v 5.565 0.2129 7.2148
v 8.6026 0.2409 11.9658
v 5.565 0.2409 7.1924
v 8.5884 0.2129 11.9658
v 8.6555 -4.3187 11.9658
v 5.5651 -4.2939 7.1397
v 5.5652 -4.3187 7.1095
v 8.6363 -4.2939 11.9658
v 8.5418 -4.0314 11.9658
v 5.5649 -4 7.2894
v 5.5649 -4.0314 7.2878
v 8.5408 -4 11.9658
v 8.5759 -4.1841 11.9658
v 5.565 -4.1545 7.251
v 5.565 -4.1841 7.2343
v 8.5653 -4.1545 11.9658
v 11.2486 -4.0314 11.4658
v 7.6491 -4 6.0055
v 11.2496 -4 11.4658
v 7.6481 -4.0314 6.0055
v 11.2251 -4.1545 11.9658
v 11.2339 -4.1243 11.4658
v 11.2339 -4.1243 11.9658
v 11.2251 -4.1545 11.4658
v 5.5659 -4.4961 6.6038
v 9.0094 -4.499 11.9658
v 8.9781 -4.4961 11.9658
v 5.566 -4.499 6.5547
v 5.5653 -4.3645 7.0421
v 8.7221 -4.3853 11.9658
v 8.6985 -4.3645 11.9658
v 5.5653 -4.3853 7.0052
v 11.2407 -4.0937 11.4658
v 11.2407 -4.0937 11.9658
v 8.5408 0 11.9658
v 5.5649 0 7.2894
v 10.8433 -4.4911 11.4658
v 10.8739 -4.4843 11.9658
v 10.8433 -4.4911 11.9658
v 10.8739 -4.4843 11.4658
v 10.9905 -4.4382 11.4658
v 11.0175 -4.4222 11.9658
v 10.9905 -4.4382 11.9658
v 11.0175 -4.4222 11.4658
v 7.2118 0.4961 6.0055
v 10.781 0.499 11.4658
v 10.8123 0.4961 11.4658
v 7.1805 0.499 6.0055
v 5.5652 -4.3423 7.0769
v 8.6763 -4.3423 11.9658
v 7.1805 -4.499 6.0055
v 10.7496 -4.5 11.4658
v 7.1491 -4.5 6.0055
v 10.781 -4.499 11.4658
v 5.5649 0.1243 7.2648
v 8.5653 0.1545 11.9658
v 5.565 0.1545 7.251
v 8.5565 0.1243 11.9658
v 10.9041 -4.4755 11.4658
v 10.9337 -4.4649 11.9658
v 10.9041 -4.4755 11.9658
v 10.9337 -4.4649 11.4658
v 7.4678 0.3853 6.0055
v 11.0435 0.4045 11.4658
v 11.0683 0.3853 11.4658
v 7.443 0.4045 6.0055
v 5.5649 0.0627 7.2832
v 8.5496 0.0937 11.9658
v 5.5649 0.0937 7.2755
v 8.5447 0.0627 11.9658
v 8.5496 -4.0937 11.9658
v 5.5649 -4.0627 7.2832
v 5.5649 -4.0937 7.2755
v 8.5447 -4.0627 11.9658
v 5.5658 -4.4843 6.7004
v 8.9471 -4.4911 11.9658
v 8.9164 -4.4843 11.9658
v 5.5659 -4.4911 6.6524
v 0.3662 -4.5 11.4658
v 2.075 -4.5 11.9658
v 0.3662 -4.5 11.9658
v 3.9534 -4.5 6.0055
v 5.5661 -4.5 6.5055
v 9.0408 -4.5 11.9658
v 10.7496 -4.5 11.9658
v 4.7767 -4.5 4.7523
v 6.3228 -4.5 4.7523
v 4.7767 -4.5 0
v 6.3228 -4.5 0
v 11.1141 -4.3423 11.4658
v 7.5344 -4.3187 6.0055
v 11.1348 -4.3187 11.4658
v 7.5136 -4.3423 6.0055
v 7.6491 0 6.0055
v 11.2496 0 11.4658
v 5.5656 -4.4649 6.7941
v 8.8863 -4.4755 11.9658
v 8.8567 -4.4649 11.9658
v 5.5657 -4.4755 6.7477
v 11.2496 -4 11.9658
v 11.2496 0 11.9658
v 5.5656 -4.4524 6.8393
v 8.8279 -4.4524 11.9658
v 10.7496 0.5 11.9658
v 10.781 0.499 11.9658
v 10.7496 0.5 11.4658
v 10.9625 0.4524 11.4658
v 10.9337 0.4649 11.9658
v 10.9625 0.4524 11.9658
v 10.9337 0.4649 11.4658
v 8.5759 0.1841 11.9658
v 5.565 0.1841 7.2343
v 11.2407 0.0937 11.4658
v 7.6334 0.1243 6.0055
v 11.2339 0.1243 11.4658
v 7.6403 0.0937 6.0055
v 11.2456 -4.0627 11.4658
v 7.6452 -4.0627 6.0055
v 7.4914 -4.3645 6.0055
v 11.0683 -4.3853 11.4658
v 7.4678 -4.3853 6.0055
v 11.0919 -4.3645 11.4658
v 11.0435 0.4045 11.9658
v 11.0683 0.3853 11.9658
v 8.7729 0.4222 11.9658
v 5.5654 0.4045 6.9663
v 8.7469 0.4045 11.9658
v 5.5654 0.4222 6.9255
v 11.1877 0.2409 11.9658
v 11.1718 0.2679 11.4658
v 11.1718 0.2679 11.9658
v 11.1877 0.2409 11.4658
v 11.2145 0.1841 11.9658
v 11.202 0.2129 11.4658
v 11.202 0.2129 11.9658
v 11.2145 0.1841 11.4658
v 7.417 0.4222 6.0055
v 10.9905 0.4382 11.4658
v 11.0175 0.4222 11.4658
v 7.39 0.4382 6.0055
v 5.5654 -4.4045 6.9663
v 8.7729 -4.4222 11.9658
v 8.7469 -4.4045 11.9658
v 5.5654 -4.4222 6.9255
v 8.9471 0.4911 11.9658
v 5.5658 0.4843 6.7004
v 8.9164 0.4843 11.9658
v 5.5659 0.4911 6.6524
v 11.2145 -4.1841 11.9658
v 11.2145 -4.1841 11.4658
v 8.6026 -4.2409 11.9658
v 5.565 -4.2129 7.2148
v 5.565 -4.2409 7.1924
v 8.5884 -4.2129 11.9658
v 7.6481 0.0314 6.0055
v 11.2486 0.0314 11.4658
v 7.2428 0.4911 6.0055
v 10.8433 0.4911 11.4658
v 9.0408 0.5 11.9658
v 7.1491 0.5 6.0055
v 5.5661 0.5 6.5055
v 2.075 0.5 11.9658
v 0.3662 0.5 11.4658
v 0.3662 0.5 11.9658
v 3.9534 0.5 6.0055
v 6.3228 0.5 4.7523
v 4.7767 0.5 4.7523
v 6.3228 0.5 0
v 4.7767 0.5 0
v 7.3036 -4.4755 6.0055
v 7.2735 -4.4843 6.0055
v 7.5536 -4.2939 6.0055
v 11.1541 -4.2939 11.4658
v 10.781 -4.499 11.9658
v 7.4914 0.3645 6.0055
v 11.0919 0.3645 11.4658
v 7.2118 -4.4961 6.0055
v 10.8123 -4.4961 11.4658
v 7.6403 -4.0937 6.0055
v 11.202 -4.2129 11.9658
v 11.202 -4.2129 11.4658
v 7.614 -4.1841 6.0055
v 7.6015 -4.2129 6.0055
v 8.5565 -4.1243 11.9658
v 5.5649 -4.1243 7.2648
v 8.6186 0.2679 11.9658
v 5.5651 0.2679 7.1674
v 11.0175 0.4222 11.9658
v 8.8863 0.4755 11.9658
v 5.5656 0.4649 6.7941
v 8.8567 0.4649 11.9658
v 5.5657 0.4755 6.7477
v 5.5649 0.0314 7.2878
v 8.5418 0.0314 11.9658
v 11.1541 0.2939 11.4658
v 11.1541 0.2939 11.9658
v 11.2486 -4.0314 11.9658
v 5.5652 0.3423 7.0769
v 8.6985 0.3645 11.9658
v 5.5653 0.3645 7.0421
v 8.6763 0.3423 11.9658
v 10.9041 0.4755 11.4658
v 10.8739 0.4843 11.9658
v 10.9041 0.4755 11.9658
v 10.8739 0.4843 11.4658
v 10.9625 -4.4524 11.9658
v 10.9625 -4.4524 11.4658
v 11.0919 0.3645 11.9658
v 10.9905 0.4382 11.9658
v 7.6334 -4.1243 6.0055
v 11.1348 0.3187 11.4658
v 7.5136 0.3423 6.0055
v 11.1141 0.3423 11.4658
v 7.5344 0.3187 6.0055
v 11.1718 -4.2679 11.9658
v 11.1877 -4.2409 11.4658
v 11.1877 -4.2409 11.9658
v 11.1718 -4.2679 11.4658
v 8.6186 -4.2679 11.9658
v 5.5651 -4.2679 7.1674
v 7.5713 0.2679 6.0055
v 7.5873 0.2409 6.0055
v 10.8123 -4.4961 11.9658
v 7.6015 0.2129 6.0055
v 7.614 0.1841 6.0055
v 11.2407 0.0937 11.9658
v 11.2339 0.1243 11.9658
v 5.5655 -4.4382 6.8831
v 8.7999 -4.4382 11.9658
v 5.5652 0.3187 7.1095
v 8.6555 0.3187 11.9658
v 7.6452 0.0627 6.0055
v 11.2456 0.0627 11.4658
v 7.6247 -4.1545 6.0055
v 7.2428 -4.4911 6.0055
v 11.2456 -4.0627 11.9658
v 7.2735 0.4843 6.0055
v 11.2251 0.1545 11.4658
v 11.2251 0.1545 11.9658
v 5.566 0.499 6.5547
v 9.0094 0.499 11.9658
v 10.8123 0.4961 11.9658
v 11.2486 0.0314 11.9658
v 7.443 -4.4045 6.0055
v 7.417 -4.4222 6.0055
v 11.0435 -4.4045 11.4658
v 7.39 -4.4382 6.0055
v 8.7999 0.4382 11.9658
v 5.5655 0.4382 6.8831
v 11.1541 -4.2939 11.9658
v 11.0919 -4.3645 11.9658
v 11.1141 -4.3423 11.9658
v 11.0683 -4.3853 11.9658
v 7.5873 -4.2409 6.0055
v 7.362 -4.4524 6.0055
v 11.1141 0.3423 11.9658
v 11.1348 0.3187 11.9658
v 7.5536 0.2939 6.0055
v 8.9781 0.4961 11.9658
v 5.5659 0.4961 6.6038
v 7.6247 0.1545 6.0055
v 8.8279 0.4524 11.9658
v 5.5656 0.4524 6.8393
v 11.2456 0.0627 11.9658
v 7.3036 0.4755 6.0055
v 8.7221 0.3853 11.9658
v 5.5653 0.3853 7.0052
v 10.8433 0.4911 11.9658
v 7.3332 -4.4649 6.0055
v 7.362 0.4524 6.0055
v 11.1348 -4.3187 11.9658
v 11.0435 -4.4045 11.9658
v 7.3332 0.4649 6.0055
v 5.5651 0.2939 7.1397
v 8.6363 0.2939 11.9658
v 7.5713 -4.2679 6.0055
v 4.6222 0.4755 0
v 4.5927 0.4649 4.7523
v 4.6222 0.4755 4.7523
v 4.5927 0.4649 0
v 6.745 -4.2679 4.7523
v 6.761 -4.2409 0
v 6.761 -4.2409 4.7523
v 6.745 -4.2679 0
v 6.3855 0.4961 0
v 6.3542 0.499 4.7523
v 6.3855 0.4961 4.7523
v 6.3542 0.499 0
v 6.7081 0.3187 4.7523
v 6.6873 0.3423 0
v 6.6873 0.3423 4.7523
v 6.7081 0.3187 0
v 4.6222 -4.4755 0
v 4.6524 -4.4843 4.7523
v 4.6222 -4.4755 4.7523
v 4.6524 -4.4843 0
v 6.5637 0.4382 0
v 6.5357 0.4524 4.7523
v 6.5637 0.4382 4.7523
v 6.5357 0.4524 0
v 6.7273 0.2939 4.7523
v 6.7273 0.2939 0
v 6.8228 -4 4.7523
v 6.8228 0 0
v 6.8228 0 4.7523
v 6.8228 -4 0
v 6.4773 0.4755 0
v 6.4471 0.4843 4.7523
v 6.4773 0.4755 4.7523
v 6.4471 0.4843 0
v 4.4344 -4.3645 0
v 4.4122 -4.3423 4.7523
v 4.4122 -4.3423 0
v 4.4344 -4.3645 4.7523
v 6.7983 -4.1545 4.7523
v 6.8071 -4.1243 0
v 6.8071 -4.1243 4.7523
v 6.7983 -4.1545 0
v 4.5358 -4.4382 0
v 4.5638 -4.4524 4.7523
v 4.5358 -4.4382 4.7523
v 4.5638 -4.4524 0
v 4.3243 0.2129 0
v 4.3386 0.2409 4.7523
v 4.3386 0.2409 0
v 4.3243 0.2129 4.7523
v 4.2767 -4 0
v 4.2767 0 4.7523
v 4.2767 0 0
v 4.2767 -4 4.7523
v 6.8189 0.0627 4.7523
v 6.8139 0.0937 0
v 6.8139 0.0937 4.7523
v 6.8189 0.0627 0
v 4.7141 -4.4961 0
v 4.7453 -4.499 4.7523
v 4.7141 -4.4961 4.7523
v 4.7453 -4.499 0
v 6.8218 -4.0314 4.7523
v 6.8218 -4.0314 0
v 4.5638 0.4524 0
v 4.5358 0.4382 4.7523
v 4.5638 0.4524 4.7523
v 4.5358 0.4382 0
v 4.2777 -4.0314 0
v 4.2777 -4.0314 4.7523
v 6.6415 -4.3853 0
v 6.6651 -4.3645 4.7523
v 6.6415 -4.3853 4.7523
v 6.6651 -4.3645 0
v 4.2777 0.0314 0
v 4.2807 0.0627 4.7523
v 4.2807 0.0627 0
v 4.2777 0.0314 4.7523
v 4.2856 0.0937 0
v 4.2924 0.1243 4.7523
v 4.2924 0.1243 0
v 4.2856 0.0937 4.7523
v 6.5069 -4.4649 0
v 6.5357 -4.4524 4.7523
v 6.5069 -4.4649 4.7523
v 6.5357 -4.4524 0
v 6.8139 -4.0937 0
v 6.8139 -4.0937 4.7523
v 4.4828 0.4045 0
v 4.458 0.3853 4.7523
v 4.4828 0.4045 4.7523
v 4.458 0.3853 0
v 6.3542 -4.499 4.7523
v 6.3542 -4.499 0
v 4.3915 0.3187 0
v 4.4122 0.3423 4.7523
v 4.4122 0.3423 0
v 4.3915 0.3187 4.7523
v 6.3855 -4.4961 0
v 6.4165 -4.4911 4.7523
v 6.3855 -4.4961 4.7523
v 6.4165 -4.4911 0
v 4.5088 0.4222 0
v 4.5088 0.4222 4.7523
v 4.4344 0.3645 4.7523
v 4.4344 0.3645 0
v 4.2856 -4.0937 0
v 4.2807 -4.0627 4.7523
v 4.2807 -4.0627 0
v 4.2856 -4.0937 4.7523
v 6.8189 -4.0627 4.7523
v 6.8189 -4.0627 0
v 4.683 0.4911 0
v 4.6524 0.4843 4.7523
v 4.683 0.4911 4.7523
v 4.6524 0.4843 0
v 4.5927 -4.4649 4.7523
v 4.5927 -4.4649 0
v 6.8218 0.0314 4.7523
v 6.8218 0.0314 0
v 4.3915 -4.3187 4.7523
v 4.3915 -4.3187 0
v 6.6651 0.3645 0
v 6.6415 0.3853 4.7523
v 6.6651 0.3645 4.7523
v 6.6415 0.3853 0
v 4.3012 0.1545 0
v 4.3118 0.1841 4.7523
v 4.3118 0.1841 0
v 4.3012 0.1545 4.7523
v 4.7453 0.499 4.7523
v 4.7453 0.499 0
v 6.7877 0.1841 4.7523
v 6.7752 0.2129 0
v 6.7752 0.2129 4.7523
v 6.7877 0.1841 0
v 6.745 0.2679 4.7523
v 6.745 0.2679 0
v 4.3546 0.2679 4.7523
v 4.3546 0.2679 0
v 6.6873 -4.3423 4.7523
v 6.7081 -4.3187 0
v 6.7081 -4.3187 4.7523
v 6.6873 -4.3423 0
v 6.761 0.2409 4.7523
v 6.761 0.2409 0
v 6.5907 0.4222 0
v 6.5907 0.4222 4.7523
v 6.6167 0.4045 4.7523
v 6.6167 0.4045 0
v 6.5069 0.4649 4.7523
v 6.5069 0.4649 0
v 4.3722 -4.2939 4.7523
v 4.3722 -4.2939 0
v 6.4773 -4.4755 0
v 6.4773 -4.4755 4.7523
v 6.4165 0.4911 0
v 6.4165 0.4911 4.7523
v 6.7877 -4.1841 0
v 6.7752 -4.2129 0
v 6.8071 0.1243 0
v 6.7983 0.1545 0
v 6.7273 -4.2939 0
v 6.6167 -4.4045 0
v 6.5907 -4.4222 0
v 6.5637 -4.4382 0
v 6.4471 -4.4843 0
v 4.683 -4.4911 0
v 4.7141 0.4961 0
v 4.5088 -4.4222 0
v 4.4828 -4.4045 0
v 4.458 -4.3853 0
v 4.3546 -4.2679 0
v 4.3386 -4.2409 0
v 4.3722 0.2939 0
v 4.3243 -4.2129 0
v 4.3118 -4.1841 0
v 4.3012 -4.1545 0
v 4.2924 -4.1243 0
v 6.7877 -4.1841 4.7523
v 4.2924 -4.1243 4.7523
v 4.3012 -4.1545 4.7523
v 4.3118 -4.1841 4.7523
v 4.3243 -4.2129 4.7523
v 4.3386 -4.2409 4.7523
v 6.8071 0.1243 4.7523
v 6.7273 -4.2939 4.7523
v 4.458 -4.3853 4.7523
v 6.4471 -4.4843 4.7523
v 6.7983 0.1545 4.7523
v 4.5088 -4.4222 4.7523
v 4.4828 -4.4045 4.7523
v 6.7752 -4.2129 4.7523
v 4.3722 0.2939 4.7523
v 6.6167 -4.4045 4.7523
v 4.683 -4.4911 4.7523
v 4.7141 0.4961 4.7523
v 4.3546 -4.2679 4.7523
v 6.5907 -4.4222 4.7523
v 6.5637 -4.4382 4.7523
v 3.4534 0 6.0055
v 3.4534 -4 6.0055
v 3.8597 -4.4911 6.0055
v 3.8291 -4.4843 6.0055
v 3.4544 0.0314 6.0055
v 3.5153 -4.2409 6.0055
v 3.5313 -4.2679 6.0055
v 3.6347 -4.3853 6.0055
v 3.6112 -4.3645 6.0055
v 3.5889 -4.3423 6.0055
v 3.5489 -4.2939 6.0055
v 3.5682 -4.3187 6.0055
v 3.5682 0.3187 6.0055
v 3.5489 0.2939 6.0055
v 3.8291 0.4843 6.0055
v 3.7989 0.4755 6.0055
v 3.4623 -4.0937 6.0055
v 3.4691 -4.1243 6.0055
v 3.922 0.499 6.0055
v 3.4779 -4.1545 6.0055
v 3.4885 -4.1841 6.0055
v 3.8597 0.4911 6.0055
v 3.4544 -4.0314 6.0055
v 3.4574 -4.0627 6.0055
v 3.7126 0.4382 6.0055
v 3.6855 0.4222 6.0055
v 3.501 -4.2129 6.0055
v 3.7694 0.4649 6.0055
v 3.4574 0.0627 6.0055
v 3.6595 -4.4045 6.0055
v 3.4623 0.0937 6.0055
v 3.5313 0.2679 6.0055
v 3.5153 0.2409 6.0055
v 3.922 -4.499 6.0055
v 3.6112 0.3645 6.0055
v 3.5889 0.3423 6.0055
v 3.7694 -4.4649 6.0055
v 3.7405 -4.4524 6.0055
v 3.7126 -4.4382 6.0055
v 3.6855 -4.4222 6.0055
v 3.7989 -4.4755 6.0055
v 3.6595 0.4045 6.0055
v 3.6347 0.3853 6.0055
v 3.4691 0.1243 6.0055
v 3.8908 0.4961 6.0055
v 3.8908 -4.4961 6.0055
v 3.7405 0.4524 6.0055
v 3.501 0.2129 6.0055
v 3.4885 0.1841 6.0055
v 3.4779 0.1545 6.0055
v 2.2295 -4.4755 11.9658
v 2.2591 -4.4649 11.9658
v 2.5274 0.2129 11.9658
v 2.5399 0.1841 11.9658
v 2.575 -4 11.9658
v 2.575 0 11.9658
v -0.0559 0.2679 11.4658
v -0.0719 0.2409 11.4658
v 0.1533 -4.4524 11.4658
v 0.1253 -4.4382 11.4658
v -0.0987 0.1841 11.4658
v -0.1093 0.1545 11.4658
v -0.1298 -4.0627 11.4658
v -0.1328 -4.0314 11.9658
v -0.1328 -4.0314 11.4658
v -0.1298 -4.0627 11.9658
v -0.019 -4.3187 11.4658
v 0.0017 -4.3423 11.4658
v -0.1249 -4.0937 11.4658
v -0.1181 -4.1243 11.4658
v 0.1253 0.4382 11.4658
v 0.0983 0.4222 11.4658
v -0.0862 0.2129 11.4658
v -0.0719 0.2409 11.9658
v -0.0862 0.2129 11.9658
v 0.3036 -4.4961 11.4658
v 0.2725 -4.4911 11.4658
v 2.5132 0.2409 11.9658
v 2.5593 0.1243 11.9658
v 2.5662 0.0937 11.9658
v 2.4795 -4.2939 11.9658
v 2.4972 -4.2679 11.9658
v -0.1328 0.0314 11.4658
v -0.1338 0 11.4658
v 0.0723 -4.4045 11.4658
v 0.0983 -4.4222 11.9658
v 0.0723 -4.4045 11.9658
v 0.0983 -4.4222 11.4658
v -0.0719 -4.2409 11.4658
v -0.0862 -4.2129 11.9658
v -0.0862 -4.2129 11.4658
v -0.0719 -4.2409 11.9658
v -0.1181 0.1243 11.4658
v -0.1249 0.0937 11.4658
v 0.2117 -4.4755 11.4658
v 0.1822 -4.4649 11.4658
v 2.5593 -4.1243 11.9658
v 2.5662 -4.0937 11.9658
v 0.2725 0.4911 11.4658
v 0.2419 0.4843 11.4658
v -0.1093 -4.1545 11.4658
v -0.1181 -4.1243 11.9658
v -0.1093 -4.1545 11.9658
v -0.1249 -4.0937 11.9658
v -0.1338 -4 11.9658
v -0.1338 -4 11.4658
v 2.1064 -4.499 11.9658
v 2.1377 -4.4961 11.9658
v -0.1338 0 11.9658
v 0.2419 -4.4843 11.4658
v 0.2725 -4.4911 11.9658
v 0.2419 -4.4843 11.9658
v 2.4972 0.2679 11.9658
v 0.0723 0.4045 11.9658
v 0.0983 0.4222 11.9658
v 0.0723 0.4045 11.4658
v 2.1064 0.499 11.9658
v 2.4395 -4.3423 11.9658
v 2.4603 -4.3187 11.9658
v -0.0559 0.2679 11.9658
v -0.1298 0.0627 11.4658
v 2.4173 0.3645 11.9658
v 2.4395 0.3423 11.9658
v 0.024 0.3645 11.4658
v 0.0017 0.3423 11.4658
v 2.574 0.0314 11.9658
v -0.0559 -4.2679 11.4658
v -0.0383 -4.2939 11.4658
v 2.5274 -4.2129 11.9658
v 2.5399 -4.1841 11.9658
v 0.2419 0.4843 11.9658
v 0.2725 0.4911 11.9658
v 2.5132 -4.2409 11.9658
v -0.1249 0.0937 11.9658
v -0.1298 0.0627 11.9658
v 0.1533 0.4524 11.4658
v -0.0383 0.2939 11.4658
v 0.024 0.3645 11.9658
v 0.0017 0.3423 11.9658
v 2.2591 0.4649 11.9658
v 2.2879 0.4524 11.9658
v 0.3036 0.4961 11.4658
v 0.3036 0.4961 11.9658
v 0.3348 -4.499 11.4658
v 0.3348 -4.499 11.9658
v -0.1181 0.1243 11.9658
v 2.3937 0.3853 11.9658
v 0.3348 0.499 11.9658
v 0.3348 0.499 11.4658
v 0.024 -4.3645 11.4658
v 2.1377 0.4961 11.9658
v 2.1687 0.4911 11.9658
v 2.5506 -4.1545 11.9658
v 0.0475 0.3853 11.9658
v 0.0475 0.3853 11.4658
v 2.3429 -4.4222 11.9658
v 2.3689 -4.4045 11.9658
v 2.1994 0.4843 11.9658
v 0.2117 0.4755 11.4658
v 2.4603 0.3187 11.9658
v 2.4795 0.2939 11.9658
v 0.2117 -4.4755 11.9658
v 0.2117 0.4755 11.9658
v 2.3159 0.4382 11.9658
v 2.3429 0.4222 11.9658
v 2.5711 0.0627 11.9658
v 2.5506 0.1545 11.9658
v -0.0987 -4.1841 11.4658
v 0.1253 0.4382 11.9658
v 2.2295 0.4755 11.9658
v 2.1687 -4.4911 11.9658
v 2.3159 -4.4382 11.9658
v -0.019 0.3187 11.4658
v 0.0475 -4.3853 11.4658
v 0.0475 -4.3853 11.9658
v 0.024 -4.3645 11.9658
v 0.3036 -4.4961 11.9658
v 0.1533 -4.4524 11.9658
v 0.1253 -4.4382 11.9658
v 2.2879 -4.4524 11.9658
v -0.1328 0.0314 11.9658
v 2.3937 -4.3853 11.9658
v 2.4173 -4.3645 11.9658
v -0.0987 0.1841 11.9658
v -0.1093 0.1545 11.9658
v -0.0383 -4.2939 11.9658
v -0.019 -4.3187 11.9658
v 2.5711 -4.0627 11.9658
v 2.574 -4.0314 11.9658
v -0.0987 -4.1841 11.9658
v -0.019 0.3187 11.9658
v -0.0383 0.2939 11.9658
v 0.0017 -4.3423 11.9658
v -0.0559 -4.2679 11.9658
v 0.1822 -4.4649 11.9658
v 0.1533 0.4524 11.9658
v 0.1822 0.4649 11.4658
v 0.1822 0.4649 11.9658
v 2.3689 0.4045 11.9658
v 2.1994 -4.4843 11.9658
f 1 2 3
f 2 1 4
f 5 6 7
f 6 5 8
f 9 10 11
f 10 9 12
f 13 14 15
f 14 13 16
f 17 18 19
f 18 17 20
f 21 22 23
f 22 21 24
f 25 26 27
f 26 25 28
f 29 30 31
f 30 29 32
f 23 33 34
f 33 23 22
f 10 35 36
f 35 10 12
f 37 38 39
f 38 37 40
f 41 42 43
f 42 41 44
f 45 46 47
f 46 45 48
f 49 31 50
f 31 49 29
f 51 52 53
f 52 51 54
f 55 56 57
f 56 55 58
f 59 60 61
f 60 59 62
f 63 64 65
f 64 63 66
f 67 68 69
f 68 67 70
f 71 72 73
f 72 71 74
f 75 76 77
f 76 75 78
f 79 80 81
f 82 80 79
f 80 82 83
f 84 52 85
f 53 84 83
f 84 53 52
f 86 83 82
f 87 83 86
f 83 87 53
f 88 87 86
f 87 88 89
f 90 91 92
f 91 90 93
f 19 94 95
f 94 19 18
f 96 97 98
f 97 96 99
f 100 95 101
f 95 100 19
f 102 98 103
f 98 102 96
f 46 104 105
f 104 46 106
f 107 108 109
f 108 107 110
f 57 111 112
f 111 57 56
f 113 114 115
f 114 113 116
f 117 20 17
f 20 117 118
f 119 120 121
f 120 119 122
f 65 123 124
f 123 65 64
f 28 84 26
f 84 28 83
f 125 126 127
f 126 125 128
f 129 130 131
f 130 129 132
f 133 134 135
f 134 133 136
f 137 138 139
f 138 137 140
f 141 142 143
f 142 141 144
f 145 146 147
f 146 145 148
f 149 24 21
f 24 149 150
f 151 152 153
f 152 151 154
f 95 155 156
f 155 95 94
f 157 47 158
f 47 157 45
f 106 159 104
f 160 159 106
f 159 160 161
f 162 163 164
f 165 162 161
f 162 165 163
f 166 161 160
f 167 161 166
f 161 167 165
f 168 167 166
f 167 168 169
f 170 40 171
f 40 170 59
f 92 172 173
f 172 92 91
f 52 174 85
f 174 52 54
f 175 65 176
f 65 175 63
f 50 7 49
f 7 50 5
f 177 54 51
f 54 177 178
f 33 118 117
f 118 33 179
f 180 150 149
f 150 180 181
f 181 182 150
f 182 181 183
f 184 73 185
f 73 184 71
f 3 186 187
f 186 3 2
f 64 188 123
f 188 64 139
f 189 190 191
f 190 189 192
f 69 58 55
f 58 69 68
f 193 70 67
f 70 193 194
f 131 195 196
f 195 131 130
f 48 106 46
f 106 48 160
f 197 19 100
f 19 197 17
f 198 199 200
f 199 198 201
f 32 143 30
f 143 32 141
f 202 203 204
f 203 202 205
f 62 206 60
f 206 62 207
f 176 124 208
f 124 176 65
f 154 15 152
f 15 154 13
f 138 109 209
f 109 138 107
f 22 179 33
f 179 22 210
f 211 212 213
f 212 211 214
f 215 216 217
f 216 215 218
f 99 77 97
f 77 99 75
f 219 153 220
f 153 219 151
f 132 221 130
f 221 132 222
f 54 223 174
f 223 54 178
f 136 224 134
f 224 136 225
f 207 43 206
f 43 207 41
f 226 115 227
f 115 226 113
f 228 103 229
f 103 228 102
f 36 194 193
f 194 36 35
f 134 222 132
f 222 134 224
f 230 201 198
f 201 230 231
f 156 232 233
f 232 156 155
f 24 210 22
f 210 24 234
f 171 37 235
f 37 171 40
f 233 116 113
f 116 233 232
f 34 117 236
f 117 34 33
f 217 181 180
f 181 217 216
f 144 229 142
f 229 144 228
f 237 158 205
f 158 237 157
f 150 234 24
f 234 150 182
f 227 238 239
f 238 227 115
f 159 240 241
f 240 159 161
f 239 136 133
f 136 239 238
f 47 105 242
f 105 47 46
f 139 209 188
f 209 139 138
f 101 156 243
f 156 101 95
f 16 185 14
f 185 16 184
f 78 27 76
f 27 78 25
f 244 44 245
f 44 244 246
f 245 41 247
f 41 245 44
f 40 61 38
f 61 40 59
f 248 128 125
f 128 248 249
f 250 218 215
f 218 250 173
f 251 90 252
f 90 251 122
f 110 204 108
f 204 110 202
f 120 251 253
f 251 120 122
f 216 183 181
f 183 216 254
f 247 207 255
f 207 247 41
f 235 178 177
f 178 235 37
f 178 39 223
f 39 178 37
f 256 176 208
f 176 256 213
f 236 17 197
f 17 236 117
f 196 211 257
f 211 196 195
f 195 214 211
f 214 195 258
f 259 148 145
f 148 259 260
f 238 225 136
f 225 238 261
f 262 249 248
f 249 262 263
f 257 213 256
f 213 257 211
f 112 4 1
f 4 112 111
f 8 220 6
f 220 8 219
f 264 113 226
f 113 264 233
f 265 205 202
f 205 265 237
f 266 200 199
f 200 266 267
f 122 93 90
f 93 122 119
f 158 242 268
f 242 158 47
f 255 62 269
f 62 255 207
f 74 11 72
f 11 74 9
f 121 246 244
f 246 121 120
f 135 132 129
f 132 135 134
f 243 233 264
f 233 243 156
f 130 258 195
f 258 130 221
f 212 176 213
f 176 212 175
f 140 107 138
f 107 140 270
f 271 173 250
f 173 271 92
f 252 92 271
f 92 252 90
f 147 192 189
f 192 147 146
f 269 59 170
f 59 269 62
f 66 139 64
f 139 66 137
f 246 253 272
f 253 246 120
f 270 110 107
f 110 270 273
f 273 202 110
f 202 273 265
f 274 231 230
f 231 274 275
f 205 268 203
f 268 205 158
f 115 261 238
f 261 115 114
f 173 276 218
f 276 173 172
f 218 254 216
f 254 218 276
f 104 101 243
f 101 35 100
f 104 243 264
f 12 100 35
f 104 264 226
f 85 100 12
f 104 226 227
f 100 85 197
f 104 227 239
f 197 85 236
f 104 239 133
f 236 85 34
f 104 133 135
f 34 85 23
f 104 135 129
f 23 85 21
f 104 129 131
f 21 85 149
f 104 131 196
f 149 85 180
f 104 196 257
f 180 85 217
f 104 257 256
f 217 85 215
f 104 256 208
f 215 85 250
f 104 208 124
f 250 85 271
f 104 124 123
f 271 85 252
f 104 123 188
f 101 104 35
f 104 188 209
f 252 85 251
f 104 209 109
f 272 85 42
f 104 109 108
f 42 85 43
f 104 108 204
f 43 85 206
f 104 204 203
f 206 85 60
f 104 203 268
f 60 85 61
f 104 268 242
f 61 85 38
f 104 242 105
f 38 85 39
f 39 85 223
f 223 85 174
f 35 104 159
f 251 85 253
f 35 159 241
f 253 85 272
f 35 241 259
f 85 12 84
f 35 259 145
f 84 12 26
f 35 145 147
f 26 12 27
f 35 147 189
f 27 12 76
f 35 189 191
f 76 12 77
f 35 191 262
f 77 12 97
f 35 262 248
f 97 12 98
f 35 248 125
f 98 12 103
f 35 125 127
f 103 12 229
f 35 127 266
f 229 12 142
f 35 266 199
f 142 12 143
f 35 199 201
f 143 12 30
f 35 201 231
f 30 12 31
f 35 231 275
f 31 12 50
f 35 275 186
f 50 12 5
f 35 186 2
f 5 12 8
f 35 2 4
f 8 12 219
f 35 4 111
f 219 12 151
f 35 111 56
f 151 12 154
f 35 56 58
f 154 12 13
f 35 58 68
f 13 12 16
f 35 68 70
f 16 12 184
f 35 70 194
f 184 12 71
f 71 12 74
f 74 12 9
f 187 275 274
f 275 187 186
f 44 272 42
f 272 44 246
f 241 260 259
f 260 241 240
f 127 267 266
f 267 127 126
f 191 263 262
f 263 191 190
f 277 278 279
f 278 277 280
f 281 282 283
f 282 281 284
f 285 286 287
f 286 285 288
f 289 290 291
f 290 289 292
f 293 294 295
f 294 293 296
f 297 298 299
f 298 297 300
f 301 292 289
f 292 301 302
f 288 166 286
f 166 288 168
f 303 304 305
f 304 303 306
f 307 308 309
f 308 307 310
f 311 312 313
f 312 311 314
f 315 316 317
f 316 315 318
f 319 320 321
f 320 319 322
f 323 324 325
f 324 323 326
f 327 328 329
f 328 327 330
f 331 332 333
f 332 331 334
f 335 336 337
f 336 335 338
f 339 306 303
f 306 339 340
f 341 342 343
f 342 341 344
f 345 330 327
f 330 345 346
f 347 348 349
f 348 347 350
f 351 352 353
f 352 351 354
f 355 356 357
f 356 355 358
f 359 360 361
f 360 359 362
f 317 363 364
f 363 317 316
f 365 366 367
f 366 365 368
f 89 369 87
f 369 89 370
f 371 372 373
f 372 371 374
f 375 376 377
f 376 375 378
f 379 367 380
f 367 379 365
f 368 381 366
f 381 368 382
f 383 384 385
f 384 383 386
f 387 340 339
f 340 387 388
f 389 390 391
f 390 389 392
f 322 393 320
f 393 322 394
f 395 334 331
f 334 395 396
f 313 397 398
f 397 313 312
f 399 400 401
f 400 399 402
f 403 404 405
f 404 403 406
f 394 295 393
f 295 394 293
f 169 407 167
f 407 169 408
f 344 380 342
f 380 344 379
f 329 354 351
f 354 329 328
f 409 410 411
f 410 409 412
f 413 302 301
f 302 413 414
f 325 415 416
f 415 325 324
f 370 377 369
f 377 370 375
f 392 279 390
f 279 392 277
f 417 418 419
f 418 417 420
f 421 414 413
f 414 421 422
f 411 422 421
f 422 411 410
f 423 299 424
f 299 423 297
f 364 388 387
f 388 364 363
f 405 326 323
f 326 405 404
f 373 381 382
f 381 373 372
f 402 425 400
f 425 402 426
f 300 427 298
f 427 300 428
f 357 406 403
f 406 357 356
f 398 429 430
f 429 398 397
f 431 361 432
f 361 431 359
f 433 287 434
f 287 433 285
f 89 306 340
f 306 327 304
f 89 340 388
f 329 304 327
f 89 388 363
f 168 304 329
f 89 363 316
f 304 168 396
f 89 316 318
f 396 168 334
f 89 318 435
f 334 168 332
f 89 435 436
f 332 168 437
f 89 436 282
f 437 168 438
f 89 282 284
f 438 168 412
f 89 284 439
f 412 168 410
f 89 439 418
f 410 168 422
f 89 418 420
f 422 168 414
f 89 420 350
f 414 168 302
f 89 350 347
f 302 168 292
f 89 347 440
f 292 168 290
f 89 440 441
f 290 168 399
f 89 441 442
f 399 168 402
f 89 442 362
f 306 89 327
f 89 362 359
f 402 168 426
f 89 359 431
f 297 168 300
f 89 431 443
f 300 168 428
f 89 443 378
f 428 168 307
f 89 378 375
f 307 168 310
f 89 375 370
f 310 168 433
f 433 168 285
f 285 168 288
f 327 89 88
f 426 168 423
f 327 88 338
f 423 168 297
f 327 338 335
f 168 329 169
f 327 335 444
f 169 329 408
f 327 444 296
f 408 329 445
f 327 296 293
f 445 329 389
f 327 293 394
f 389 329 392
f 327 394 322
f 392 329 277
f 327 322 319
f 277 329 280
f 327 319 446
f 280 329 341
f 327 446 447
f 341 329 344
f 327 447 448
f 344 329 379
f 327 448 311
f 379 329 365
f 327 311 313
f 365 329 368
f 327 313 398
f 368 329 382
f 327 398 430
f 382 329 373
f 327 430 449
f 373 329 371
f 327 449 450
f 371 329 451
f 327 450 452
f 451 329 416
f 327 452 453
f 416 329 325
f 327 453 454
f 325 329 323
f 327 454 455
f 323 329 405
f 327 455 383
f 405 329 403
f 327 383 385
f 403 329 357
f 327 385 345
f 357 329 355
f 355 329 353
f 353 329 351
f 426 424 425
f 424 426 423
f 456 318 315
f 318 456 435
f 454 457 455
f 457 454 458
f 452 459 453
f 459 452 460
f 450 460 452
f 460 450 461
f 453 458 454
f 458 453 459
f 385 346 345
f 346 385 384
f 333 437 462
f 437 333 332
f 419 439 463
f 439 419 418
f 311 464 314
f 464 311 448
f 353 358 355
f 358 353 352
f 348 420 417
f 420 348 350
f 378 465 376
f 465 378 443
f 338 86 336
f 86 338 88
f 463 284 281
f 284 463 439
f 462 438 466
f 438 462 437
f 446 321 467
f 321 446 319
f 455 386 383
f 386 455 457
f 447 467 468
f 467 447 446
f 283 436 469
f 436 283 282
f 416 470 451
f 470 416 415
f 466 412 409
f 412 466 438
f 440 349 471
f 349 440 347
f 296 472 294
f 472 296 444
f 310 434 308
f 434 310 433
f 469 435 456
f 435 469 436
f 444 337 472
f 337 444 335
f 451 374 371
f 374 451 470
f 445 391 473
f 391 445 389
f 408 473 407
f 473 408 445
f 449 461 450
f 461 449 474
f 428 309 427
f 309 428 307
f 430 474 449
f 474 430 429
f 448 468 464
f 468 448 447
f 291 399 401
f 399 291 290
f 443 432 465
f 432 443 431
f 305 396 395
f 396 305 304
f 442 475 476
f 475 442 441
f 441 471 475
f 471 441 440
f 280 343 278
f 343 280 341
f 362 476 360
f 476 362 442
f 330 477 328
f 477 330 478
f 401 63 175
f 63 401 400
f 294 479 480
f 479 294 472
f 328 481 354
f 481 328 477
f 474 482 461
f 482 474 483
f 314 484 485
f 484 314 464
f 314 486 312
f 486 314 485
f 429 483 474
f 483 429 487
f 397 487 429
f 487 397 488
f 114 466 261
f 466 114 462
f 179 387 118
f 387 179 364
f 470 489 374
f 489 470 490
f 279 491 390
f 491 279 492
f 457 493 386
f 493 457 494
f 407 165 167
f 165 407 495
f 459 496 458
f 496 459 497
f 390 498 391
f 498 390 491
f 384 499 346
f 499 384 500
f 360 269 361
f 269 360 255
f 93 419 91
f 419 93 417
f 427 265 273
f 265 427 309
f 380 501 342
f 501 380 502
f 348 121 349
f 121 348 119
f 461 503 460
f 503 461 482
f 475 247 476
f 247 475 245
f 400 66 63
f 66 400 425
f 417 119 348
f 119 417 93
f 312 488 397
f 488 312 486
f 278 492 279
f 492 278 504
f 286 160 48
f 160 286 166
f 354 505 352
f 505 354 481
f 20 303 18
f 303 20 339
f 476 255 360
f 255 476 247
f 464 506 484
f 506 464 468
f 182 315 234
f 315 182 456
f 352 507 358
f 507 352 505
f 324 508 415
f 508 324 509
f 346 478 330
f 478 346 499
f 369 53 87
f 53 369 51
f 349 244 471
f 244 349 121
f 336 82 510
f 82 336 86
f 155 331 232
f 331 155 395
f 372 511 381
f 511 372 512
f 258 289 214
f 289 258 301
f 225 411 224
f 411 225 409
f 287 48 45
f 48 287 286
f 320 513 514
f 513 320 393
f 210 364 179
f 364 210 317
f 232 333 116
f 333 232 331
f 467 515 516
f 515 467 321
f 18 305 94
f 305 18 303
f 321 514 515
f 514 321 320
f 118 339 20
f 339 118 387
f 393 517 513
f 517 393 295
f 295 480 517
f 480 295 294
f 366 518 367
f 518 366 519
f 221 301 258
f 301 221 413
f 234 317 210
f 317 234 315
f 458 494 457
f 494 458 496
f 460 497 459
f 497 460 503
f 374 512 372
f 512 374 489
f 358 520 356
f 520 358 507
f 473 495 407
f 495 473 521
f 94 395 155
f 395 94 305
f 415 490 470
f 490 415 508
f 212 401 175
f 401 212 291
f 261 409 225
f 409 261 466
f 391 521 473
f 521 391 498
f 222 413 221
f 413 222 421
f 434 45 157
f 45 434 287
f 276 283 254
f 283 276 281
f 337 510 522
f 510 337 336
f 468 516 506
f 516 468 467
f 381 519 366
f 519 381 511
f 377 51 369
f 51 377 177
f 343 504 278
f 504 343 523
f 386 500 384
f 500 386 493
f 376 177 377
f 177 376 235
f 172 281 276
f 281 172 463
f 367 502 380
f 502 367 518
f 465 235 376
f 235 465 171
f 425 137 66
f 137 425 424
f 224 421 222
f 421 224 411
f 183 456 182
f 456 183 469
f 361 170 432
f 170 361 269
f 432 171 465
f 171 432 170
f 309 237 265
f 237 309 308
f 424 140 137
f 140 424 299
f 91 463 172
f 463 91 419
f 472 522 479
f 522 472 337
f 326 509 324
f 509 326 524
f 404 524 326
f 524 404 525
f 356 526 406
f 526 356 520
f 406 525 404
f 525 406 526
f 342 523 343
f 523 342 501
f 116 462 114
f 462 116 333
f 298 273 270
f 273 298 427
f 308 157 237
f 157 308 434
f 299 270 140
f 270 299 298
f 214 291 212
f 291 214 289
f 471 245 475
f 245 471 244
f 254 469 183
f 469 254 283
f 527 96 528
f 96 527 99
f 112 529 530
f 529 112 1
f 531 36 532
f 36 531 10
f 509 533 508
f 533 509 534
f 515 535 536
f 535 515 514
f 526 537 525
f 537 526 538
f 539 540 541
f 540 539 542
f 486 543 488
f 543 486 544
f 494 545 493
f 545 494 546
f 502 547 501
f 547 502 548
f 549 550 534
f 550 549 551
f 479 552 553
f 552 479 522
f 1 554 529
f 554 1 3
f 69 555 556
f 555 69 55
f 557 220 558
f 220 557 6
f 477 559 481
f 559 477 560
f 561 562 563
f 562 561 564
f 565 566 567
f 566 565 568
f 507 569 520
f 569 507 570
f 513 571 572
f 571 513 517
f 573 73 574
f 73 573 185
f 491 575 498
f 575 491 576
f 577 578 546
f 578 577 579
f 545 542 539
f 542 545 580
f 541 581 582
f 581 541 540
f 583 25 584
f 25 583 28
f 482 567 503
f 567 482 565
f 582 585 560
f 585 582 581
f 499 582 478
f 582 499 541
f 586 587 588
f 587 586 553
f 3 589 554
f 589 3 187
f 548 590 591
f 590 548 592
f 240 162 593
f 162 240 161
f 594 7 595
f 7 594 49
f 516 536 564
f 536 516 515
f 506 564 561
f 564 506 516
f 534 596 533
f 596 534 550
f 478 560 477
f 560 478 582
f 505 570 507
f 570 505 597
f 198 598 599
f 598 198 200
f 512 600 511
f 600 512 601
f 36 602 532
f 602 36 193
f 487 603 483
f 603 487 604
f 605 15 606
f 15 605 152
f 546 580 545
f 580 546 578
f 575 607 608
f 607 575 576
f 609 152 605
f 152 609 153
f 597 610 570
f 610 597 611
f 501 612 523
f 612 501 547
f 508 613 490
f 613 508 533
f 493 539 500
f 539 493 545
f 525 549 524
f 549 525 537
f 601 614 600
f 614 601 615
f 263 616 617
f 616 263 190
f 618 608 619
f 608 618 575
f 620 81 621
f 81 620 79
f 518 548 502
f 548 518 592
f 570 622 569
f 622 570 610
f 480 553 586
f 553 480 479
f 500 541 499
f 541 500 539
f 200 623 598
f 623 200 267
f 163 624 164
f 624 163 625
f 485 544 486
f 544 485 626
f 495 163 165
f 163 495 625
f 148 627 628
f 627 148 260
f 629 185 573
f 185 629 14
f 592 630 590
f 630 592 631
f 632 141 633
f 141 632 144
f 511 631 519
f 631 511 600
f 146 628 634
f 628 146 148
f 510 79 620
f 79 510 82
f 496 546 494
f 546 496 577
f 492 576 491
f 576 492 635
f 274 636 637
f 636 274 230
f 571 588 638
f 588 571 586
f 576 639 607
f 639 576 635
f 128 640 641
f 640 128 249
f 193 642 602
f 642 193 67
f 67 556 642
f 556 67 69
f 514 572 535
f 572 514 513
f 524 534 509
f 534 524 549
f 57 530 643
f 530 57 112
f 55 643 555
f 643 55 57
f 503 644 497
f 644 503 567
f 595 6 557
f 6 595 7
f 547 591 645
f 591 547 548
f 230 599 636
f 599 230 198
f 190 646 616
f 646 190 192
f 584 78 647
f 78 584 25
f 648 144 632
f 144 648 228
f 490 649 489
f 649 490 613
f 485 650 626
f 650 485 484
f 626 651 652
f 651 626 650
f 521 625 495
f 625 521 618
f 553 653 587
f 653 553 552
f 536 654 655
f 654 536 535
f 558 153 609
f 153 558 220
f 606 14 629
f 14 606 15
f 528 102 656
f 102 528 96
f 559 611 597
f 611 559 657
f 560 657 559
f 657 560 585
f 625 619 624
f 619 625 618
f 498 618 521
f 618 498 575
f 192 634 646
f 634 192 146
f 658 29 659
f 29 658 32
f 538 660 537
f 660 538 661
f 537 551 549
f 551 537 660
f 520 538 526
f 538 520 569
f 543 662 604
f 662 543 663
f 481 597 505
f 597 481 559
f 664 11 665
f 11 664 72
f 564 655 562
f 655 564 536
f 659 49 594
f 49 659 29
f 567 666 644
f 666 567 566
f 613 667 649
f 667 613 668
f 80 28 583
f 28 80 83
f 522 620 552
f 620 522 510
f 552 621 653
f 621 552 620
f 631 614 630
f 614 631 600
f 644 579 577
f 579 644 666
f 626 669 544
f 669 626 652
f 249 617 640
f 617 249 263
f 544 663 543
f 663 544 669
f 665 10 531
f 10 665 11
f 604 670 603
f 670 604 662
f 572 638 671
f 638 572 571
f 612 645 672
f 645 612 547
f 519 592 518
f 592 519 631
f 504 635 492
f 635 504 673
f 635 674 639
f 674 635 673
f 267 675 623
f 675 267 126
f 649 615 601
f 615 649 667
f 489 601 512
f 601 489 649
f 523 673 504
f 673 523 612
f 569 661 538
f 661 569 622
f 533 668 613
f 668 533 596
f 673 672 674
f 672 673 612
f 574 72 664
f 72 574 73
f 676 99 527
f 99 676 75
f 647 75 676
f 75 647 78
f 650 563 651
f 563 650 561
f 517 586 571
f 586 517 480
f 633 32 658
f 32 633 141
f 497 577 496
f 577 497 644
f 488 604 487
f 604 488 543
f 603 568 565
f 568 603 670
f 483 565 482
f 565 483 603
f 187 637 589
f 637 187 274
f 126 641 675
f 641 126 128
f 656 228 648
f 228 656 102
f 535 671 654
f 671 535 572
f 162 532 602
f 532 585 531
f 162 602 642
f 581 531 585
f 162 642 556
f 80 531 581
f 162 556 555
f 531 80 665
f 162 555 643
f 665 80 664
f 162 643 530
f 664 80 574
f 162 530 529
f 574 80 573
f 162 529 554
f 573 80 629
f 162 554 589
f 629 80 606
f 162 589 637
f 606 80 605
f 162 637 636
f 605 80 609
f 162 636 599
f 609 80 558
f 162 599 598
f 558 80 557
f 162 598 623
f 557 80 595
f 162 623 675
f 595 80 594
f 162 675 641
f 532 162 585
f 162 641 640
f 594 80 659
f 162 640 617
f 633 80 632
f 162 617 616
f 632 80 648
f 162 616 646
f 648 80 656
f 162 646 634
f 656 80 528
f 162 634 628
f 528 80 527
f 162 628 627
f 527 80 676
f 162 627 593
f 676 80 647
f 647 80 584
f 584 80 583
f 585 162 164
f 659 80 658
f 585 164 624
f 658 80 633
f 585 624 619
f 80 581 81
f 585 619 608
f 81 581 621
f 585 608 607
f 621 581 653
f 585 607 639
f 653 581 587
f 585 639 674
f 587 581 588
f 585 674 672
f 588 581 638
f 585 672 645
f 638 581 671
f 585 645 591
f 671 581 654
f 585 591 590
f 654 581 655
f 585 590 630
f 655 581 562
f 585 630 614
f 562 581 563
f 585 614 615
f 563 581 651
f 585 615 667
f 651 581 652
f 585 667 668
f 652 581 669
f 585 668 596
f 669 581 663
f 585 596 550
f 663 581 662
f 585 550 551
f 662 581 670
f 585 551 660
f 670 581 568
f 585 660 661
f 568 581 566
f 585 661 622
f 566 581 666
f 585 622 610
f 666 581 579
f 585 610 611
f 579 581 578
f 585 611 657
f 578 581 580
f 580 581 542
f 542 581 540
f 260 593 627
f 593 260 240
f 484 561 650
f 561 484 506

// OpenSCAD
// Support text
// Support V Y I 
TextParam = "Y"; //  Text

Text_Size = 12;  //  Text size
Text_Thickness = 4;  //  Text thickness
Radius = 0.5;  //  Text radius
fnt = "Arial:style=Regular"; //  Police texte
$fn=100;

color("Red")
    minkowski() {
        rotate([90,0,0]) {
        linear_extrude(height = Text_Thickness) {
        text(text = TextParam, size = Text_Size, font = fnt );
            }
    }
	cylinder(r=Radius,h=0.5);
}
